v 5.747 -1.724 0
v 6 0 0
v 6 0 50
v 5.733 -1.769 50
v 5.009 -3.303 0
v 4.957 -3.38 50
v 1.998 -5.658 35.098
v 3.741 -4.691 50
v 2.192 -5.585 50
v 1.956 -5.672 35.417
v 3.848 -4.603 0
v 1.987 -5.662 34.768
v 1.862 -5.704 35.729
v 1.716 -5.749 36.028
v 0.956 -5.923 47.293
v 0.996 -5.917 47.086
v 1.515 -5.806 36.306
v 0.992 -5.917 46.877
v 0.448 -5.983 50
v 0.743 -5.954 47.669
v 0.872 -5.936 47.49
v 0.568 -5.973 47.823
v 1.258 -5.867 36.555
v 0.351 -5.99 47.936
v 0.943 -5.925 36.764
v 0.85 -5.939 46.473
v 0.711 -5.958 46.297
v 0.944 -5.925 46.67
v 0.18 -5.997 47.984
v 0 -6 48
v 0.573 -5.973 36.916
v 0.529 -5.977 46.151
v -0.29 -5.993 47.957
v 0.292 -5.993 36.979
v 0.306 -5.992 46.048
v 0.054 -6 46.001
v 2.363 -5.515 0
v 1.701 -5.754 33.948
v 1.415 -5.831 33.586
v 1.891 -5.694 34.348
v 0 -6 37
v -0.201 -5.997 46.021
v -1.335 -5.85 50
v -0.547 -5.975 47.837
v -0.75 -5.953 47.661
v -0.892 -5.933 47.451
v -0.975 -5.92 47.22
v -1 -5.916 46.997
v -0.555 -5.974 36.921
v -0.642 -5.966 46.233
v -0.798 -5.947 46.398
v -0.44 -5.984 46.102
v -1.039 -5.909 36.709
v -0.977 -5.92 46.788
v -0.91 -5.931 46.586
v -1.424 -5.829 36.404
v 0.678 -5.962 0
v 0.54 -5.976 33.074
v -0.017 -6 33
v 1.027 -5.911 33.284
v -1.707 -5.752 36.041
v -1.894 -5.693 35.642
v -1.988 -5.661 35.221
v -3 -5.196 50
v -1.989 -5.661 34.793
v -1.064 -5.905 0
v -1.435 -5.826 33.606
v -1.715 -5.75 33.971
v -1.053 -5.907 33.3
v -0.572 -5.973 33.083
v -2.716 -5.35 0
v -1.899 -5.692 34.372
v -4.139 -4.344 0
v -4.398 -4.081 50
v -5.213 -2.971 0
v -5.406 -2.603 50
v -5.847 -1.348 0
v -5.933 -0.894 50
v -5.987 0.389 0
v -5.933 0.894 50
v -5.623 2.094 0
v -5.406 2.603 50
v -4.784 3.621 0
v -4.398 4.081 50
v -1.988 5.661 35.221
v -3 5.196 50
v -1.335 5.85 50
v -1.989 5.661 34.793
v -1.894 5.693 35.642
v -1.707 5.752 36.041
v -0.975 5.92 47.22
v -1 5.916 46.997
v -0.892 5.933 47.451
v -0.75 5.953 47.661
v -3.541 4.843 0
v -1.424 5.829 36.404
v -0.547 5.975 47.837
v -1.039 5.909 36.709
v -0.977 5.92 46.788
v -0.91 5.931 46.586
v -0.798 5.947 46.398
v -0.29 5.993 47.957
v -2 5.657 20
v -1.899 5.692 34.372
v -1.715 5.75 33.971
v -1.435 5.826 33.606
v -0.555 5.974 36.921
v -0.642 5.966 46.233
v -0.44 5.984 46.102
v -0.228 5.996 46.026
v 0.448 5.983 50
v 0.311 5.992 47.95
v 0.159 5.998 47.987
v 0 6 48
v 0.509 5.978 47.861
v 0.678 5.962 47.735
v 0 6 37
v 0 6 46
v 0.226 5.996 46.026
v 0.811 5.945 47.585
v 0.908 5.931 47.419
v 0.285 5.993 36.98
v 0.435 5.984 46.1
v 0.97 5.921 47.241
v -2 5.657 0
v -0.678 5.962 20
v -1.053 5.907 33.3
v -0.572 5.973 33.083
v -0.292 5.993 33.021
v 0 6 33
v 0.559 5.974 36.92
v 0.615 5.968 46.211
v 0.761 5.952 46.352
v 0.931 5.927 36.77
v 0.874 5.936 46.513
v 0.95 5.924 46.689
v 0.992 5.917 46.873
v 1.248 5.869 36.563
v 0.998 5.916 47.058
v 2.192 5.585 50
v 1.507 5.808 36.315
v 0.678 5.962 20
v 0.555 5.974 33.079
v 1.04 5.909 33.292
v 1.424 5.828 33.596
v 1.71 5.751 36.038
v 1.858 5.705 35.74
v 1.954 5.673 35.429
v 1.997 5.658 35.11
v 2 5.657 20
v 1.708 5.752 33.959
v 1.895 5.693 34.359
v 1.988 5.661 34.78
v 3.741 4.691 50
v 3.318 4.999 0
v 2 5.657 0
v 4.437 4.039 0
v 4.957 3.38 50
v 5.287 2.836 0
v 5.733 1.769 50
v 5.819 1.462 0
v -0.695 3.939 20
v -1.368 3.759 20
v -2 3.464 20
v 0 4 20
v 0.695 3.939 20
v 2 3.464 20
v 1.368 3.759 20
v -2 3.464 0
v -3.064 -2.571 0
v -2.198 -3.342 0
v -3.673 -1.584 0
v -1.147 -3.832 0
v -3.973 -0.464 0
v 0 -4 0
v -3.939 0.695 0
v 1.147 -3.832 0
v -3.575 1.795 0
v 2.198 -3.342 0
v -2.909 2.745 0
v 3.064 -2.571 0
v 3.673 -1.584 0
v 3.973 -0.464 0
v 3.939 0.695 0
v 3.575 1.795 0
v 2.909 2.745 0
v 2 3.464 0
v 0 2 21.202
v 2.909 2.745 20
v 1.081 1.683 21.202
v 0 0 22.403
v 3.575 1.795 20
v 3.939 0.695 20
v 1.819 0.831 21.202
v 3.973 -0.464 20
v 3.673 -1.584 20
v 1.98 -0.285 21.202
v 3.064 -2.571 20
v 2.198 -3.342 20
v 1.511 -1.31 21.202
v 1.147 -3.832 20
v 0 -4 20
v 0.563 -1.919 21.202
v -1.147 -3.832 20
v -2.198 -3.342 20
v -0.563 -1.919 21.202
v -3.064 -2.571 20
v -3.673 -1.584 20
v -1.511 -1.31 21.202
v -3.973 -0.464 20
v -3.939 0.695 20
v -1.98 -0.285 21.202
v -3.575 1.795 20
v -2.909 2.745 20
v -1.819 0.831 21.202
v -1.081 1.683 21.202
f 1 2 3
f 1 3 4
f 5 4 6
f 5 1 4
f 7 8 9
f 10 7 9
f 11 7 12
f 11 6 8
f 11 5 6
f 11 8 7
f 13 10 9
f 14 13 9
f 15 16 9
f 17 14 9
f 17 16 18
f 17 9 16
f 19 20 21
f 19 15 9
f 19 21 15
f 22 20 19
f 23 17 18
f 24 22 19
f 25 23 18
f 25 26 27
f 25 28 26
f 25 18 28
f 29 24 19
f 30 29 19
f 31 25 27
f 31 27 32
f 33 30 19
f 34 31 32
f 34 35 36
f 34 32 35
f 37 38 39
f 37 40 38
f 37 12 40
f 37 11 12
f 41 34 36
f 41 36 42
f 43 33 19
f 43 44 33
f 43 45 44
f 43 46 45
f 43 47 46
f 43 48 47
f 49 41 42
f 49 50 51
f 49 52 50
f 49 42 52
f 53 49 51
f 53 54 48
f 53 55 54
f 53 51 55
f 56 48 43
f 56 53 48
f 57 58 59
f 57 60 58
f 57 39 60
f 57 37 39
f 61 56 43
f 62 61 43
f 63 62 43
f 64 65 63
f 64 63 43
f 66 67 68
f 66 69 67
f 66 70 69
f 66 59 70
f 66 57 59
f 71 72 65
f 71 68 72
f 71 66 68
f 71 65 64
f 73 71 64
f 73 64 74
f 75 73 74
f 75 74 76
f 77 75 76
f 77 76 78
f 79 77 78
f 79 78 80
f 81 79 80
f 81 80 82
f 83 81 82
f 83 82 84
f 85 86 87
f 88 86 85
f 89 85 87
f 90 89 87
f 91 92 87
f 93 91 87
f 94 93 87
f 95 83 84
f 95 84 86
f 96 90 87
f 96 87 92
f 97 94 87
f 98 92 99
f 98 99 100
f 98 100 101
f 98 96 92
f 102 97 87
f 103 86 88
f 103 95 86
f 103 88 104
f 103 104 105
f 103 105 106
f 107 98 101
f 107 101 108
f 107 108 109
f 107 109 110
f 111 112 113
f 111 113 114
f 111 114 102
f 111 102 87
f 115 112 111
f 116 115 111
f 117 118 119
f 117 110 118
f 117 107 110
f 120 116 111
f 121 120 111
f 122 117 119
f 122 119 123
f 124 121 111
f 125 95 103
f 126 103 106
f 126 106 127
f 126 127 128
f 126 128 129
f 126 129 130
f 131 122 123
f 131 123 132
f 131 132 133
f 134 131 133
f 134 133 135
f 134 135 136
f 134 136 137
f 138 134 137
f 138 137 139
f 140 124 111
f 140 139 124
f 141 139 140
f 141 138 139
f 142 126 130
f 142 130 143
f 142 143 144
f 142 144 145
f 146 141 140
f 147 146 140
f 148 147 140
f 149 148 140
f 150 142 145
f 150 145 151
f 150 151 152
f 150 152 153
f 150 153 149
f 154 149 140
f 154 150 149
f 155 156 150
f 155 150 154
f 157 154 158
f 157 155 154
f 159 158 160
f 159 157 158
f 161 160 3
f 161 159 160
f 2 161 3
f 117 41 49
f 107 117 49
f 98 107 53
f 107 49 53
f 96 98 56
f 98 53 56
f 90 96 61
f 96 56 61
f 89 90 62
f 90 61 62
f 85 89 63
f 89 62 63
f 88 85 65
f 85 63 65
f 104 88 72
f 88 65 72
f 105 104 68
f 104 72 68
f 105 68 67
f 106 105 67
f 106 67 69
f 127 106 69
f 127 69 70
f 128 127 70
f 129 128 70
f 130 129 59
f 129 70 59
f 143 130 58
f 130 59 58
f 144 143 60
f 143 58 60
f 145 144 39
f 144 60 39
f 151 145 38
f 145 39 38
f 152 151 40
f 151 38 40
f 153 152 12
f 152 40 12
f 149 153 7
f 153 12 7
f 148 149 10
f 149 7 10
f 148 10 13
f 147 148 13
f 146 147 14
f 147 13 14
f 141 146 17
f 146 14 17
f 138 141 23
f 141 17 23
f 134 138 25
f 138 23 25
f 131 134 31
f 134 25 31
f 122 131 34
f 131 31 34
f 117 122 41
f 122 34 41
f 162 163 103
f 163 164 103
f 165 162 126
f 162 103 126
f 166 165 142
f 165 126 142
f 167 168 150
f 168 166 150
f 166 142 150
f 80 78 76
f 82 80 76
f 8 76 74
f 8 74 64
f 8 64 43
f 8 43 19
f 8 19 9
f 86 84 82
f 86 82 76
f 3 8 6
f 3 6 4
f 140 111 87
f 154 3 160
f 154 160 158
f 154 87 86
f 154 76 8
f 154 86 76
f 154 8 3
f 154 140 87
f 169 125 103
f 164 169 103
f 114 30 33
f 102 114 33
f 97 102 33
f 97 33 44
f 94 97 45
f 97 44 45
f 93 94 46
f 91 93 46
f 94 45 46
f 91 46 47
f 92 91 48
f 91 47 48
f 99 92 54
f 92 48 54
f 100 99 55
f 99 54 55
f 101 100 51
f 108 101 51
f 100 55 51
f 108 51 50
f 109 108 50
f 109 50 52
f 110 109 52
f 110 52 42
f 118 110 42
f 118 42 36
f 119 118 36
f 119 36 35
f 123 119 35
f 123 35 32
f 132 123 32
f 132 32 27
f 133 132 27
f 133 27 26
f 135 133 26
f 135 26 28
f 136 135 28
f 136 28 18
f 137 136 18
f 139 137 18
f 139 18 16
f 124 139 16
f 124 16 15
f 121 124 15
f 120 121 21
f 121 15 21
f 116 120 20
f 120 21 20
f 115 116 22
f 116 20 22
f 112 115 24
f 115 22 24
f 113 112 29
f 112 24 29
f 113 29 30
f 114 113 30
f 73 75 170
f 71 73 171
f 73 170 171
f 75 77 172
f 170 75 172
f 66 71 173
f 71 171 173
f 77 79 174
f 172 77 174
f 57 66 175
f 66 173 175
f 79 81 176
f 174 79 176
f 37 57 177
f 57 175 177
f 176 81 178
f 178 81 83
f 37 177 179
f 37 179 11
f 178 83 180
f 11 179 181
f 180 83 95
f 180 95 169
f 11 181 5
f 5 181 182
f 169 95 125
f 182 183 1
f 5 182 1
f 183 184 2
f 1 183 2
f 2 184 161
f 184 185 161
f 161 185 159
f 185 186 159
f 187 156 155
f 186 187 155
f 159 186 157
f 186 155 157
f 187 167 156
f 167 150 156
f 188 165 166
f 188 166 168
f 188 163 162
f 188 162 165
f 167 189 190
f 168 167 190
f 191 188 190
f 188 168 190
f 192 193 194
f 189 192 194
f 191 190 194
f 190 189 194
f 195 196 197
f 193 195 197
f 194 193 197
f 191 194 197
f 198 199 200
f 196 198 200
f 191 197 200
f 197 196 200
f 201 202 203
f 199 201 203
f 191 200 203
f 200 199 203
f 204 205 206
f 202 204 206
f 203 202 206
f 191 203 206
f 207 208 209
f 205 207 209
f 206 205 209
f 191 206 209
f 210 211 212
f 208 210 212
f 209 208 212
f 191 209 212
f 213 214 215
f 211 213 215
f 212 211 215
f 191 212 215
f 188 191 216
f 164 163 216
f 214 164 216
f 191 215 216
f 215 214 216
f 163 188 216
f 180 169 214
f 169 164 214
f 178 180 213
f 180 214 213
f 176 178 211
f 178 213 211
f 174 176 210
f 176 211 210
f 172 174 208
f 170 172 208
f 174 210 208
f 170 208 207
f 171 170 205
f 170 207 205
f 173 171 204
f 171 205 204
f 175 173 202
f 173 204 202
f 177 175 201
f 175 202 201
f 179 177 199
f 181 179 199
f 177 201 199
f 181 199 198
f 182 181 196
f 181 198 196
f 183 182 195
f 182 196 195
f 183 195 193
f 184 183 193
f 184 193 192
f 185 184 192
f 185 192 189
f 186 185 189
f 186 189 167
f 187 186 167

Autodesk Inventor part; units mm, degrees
ref_plane "YZ Plane" through (0, 0, 0) normal (1, 0, 0) x (0, 1, 0)
ref_plane "XY Plane" through (0, 0, 0) normal (0, 0, 1) x (1, 0, 0)
sketch "スケッチ1" plane through (0, 0, 0) normal (0, 0, 1) x (1, 0, 0)
  circle A0 centre (0, 0) radius 6
  dimension "d0" = 12
extrude "押し出し1" add sketch "スケッチ1" along normal blind 50
ref_plane "作業平面1" through (0, 6, 0) normal (0, 1, 0) x (-1, 0, 0)
sketch "スケッチ2" plane through (0, 6, 0) normal (0, 1, 0) x (-1, 0, 0)
  line L0 (0, 0) -> (2, 0)
  line L1 (2, 0) -> (2, 20)
  line L2 (2, 20) -> (0, 20)
  line L3 (0, 20) -> (0, 0)
  line L4 (6, 0) -> (-6, 0) projected
  line L5 (0, 20) -> (-2, 20)
  line L6 (-2, 20) -> (-2, 0)
  line L7 (-2, 0) -> (0, 0)
  line L8 (0, 0) -> (0, 20)
  dimension "d3" = 2
  dimension "d4" = 20
  dimension "d5" = 2
extrude "押し出し2" cut sketch "スケッチ2" against normal blind 6
sketch "スケッチ3" plane through (0, 0, 0) normal (0, 0, -1) x (-1, 0, 0)
  point P0 (0, 0)
  point P1 (0, 0)
hole "穴1" at (0, 0, 0) direction (0, 0, 1) diameter 8 depth 20 tip angle 118
sketch "スケッチ4" plane through (0, 6, 0) normal (0, 1, 0) x (-1, 0, 0)
  line L0 (2, 20) -> (-2, 20) projected
  point P0 (0, 0)
  point P1 (0, 35)
  dimension "d15" = 15
hole "穴2" at (0, 6, 35) direction (0, -1, 0) diameter 4 end through all
sketch "スケッチ5" plane through (0, 6, 0) normal (0, 1, 0) x (-1, 0, 0)
  line L0 (6, 50) -> (-6, 50) projected
  point P0 (0, 0)
  point P1 (0, 47)
  dimension "d23" = 3
hole "穴3" at (0, 6, 47) direction (0, -1, 0) diameter 2 end through all
properties part number "jik_motor_10-50" material "アルミニウム 6061-AHC"
